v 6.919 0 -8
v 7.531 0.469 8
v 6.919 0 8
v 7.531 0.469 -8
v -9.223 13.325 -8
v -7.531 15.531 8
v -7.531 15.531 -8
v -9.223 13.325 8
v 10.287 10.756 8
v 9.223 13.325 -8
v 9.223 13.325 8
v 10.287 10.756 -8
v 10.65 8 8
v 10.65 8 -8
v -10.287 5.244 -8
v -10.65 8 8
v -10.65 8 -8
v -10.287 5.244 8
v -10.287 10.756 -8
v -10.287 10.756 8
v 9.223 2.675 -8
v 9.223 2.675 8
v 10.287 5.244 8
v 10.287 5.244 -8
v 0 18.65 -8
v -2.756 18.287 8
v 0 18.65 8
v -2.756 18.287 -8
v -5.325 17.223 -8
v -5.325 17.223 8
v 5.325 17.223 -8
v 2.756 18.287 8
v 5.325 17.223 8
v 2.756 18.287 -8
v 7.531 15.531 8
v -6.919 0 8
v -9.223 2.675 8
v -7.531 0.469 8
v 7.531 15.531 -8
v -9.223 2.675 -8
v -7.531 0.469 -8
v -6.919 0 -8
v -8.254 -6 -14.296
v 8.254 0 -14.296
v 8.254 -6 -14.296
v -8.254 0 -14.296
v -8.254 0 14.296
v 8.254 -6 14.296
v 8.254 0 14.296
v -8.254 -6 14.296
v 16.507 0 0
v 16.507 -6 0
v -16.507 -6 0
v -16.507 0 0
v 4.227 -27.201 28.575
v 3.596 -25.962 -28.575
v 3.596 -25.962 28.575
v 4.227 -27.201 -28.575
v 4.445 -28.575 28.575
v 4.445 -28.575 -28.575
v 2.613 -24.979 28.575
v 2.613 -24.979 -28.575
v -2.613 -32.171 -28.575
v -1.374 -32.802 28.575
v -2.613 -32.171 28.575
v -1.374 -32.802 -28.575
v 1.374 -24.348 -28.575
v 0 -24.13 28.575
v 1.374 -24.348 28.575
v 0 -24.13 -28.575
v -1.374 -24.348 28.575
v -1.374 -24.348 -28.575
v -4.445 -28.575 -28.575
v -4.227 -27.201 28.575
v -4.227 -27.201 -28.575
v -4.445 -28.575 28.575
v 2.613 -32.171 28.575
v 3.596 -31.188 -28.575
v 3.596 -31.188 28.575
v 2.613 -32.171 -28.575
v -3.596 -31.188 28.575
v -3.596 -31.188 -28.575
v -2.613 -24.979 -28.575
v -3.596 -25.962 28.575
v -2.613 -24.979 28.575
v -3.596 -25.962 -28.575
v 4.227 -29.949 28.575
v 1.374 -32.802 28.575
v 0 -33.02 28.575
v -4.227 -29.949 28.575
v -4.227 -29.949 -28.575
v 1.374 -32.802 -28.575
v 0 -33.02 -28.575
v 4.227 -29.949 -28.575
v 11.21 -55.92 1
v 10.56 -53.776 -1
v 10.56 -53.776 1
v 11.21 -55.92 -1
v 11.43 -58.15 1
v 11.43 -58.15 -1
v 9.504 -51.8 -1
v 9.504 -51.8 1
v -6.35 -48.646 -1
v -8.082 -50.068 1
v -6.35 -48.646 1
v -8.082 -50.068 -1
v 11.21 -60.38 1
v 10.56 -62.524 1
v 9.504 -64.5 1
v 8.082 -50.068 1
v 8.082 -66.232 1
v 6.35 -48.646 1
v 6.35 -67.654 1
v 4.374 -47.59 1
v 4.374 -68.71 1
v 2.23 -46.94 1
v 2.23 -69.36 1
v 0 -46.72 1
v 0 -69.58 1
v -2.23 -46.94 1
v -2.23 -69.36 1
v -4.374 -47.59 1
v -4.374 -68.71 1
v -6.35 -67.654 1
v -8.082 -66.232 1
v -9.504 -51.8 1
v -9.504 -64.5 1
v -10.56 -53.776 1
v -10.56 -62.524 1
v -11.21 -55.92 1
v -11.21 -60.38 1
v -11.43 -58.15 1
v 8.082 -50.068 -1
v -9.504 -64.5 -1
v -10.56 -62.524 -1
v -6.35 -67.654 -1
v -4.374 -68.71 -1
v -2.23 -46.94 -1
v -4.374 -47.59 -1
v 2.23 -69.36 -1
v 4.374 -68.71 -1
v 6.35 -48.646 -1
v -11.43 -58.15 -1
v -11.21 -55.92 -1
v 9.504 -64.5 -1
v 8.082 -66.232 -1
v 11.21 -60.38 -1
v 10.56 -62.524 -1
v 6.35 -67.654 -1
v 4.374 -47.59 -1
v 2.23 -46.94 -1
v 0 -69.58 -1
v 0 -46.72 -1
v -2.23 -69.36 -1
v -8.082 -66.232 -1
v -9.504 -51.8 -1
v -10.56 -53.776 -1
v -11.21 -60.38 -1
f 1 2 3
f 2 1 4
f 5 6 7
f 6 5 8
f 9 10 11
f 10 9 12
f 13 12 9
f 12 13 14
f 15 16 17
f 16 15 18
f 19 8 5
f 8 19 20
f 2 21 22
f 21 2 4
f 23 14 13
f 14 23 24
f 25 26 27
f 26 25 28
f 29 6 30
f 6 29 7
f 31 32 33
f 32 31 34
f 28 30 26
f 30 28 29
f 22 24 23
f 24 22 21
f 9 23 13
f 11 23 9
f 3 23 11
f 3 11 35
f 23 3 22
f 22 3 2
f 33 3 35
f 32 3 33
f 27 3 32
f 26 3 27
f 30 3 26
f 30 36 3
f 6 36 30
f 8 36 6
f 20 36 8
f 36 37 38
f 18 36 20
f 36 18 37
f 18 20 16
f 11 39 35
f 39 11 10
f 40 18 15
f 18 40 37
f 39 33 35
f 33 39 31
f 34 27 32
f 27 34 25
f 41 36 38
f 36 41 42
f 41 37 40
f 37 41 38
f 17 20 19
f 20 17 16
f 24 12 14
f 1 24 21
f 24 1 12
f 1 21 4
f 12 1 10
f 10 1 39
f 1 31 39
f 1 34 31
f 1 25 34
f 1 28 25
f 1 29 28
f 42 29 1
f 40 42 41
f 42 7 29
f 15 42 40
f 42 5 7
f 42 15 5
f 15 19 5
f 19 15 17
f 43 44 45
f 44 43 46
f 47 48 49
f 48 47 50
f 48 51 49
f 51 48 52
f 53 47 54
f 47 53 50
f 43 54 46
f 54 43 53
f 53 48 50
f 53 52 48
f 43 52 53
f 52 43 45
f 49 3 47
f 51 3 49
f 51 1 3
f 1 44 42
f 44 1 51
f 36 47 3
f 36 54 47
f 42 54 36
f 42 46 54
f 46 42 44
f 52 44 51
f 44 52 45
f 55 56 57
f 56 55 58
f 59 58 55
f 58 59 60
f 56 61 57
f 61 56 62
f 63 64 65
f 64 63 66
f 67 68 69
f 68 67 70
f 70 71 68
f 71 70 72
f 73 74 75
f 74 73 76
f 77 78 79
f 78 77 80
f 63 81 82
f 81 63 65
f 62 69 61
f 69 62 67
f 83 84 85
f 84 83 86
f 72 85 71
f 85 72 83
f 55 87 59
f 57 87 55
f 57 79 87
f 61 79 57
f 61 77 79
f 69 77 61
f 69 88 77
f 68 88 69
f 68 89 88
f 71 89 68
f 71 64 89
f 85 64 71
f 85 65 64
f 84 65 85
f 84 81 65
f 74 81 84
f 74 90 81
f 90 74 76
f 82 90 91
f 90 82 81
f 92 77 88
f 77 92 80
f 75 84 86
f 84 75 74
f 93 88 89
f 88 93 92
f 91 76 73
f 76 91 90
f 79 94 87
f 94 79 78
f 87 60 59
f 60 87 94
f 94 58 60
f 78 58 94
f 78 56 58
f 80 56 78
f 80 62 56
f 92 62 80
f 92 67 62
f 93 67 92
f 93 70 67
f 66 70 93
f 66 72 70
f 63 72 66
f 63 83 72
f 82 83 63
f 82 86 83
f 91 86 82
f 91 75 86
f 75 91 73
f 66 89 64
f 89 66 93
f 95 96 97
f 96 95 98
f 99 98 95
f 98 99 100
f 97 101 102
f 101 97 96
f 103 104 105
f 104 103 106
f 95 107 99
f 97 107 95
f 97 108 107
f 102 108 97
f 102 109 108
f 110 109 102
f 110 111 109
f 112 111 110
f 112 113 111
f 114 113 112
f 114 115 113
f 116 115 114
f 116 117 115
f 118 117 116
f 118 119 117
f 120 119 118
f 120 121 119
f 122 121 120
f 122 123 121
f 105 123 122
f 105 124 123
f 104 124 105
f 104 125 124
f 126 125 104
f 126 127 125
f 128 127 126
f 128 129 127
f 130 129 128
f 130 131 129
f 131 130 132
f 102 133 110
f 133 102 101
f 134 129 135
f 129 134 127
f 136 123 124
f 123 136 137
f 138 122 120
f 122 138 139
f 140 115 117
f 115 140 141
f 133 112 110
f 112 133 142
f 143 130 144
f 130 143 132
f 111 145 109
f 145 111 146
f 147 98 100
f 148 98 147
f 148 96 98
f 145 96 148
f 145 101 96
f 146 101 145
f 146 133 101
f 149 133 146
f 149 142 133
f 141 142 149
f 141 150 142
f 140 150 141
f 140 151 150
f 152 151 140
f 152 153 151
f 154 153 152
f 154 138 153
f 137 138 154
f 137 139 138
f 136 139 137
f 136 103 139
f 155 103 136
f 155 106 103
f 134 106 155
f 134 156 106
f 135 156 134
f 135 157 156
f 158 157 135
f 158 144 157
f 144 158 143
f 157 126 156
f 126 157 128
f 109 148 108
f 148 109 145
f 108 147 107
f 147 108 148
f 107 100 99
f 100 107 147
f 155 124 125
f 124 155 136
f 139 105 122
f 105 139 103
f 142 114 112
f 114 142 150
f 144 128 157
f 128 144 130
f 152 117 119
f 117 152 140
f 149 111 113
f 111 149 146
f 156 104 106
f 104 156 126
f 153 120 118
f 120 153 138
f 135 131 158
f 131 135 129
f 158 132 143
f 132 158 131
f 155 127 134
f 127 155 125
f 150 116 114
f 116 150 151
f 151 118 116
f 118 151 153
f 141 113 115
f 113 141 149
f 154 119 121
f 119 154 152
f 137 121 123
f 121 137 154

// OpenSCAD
// Auto-generated by scripts/author_from_manifest.py (Phase D.3).
// Source: data/phase_d_manifest.json (sku_intent='tyco-ty1234-qr-pendent-175f').
// Do not hand-edit — regenerate from the manifest.
//
// @part tyco_ty1234_qr_pendent_175f
// @kind sprinkler_head
// @category head.pendant.k56
// @display-name "Tyco TY1234 Quick-Response Pendent K5.6 175°F"
// @mfg tyco_fire_protection
// @mfg-pn TY1234
// @listing UL FM
// @hazard-classes LH OH1
// @price-usd 15.25
// @install-minutes 8
// @crew journeyman
// @k-factor 5.6
// @orientation pendant
// @response quick
// @temperature 175F
// @param size_in number default=0.5 label="Size" unit="in"
// @port inlet position=[0,0.014,0] direction=[0,1,0] style=NPT_threaded size_in=0.5 role=drop

size_in = 0.5;
k_factor = 5.6;

length_mm   = 57.15;
body_dia_mm = 25.40;
thread_od   = 21.3;
thread_len  = 16;
deflector_d = body_dia_mm * 0.9;

 union() {
    translate([0, thread_len/2, 0])
        cylinder(h = thread_len, d = thread_od, center = true, $fn = 24);
    translate([0, -3, 0])
        rotate([90, 0, 0])
        cylinder(h = 6, d = thread_od * 1.55, $fn = 6, center = true);
    translate([0, -length_mm/2, 0])
        cylinder(h = length_mm, d = body_dia_mm * 0.35, center = true, $fn = 20);
    translate([0, -length_mm - 1, 0])
        cylinder(h = 2, d = deflector_d, center = true, $fn = 32);
}
